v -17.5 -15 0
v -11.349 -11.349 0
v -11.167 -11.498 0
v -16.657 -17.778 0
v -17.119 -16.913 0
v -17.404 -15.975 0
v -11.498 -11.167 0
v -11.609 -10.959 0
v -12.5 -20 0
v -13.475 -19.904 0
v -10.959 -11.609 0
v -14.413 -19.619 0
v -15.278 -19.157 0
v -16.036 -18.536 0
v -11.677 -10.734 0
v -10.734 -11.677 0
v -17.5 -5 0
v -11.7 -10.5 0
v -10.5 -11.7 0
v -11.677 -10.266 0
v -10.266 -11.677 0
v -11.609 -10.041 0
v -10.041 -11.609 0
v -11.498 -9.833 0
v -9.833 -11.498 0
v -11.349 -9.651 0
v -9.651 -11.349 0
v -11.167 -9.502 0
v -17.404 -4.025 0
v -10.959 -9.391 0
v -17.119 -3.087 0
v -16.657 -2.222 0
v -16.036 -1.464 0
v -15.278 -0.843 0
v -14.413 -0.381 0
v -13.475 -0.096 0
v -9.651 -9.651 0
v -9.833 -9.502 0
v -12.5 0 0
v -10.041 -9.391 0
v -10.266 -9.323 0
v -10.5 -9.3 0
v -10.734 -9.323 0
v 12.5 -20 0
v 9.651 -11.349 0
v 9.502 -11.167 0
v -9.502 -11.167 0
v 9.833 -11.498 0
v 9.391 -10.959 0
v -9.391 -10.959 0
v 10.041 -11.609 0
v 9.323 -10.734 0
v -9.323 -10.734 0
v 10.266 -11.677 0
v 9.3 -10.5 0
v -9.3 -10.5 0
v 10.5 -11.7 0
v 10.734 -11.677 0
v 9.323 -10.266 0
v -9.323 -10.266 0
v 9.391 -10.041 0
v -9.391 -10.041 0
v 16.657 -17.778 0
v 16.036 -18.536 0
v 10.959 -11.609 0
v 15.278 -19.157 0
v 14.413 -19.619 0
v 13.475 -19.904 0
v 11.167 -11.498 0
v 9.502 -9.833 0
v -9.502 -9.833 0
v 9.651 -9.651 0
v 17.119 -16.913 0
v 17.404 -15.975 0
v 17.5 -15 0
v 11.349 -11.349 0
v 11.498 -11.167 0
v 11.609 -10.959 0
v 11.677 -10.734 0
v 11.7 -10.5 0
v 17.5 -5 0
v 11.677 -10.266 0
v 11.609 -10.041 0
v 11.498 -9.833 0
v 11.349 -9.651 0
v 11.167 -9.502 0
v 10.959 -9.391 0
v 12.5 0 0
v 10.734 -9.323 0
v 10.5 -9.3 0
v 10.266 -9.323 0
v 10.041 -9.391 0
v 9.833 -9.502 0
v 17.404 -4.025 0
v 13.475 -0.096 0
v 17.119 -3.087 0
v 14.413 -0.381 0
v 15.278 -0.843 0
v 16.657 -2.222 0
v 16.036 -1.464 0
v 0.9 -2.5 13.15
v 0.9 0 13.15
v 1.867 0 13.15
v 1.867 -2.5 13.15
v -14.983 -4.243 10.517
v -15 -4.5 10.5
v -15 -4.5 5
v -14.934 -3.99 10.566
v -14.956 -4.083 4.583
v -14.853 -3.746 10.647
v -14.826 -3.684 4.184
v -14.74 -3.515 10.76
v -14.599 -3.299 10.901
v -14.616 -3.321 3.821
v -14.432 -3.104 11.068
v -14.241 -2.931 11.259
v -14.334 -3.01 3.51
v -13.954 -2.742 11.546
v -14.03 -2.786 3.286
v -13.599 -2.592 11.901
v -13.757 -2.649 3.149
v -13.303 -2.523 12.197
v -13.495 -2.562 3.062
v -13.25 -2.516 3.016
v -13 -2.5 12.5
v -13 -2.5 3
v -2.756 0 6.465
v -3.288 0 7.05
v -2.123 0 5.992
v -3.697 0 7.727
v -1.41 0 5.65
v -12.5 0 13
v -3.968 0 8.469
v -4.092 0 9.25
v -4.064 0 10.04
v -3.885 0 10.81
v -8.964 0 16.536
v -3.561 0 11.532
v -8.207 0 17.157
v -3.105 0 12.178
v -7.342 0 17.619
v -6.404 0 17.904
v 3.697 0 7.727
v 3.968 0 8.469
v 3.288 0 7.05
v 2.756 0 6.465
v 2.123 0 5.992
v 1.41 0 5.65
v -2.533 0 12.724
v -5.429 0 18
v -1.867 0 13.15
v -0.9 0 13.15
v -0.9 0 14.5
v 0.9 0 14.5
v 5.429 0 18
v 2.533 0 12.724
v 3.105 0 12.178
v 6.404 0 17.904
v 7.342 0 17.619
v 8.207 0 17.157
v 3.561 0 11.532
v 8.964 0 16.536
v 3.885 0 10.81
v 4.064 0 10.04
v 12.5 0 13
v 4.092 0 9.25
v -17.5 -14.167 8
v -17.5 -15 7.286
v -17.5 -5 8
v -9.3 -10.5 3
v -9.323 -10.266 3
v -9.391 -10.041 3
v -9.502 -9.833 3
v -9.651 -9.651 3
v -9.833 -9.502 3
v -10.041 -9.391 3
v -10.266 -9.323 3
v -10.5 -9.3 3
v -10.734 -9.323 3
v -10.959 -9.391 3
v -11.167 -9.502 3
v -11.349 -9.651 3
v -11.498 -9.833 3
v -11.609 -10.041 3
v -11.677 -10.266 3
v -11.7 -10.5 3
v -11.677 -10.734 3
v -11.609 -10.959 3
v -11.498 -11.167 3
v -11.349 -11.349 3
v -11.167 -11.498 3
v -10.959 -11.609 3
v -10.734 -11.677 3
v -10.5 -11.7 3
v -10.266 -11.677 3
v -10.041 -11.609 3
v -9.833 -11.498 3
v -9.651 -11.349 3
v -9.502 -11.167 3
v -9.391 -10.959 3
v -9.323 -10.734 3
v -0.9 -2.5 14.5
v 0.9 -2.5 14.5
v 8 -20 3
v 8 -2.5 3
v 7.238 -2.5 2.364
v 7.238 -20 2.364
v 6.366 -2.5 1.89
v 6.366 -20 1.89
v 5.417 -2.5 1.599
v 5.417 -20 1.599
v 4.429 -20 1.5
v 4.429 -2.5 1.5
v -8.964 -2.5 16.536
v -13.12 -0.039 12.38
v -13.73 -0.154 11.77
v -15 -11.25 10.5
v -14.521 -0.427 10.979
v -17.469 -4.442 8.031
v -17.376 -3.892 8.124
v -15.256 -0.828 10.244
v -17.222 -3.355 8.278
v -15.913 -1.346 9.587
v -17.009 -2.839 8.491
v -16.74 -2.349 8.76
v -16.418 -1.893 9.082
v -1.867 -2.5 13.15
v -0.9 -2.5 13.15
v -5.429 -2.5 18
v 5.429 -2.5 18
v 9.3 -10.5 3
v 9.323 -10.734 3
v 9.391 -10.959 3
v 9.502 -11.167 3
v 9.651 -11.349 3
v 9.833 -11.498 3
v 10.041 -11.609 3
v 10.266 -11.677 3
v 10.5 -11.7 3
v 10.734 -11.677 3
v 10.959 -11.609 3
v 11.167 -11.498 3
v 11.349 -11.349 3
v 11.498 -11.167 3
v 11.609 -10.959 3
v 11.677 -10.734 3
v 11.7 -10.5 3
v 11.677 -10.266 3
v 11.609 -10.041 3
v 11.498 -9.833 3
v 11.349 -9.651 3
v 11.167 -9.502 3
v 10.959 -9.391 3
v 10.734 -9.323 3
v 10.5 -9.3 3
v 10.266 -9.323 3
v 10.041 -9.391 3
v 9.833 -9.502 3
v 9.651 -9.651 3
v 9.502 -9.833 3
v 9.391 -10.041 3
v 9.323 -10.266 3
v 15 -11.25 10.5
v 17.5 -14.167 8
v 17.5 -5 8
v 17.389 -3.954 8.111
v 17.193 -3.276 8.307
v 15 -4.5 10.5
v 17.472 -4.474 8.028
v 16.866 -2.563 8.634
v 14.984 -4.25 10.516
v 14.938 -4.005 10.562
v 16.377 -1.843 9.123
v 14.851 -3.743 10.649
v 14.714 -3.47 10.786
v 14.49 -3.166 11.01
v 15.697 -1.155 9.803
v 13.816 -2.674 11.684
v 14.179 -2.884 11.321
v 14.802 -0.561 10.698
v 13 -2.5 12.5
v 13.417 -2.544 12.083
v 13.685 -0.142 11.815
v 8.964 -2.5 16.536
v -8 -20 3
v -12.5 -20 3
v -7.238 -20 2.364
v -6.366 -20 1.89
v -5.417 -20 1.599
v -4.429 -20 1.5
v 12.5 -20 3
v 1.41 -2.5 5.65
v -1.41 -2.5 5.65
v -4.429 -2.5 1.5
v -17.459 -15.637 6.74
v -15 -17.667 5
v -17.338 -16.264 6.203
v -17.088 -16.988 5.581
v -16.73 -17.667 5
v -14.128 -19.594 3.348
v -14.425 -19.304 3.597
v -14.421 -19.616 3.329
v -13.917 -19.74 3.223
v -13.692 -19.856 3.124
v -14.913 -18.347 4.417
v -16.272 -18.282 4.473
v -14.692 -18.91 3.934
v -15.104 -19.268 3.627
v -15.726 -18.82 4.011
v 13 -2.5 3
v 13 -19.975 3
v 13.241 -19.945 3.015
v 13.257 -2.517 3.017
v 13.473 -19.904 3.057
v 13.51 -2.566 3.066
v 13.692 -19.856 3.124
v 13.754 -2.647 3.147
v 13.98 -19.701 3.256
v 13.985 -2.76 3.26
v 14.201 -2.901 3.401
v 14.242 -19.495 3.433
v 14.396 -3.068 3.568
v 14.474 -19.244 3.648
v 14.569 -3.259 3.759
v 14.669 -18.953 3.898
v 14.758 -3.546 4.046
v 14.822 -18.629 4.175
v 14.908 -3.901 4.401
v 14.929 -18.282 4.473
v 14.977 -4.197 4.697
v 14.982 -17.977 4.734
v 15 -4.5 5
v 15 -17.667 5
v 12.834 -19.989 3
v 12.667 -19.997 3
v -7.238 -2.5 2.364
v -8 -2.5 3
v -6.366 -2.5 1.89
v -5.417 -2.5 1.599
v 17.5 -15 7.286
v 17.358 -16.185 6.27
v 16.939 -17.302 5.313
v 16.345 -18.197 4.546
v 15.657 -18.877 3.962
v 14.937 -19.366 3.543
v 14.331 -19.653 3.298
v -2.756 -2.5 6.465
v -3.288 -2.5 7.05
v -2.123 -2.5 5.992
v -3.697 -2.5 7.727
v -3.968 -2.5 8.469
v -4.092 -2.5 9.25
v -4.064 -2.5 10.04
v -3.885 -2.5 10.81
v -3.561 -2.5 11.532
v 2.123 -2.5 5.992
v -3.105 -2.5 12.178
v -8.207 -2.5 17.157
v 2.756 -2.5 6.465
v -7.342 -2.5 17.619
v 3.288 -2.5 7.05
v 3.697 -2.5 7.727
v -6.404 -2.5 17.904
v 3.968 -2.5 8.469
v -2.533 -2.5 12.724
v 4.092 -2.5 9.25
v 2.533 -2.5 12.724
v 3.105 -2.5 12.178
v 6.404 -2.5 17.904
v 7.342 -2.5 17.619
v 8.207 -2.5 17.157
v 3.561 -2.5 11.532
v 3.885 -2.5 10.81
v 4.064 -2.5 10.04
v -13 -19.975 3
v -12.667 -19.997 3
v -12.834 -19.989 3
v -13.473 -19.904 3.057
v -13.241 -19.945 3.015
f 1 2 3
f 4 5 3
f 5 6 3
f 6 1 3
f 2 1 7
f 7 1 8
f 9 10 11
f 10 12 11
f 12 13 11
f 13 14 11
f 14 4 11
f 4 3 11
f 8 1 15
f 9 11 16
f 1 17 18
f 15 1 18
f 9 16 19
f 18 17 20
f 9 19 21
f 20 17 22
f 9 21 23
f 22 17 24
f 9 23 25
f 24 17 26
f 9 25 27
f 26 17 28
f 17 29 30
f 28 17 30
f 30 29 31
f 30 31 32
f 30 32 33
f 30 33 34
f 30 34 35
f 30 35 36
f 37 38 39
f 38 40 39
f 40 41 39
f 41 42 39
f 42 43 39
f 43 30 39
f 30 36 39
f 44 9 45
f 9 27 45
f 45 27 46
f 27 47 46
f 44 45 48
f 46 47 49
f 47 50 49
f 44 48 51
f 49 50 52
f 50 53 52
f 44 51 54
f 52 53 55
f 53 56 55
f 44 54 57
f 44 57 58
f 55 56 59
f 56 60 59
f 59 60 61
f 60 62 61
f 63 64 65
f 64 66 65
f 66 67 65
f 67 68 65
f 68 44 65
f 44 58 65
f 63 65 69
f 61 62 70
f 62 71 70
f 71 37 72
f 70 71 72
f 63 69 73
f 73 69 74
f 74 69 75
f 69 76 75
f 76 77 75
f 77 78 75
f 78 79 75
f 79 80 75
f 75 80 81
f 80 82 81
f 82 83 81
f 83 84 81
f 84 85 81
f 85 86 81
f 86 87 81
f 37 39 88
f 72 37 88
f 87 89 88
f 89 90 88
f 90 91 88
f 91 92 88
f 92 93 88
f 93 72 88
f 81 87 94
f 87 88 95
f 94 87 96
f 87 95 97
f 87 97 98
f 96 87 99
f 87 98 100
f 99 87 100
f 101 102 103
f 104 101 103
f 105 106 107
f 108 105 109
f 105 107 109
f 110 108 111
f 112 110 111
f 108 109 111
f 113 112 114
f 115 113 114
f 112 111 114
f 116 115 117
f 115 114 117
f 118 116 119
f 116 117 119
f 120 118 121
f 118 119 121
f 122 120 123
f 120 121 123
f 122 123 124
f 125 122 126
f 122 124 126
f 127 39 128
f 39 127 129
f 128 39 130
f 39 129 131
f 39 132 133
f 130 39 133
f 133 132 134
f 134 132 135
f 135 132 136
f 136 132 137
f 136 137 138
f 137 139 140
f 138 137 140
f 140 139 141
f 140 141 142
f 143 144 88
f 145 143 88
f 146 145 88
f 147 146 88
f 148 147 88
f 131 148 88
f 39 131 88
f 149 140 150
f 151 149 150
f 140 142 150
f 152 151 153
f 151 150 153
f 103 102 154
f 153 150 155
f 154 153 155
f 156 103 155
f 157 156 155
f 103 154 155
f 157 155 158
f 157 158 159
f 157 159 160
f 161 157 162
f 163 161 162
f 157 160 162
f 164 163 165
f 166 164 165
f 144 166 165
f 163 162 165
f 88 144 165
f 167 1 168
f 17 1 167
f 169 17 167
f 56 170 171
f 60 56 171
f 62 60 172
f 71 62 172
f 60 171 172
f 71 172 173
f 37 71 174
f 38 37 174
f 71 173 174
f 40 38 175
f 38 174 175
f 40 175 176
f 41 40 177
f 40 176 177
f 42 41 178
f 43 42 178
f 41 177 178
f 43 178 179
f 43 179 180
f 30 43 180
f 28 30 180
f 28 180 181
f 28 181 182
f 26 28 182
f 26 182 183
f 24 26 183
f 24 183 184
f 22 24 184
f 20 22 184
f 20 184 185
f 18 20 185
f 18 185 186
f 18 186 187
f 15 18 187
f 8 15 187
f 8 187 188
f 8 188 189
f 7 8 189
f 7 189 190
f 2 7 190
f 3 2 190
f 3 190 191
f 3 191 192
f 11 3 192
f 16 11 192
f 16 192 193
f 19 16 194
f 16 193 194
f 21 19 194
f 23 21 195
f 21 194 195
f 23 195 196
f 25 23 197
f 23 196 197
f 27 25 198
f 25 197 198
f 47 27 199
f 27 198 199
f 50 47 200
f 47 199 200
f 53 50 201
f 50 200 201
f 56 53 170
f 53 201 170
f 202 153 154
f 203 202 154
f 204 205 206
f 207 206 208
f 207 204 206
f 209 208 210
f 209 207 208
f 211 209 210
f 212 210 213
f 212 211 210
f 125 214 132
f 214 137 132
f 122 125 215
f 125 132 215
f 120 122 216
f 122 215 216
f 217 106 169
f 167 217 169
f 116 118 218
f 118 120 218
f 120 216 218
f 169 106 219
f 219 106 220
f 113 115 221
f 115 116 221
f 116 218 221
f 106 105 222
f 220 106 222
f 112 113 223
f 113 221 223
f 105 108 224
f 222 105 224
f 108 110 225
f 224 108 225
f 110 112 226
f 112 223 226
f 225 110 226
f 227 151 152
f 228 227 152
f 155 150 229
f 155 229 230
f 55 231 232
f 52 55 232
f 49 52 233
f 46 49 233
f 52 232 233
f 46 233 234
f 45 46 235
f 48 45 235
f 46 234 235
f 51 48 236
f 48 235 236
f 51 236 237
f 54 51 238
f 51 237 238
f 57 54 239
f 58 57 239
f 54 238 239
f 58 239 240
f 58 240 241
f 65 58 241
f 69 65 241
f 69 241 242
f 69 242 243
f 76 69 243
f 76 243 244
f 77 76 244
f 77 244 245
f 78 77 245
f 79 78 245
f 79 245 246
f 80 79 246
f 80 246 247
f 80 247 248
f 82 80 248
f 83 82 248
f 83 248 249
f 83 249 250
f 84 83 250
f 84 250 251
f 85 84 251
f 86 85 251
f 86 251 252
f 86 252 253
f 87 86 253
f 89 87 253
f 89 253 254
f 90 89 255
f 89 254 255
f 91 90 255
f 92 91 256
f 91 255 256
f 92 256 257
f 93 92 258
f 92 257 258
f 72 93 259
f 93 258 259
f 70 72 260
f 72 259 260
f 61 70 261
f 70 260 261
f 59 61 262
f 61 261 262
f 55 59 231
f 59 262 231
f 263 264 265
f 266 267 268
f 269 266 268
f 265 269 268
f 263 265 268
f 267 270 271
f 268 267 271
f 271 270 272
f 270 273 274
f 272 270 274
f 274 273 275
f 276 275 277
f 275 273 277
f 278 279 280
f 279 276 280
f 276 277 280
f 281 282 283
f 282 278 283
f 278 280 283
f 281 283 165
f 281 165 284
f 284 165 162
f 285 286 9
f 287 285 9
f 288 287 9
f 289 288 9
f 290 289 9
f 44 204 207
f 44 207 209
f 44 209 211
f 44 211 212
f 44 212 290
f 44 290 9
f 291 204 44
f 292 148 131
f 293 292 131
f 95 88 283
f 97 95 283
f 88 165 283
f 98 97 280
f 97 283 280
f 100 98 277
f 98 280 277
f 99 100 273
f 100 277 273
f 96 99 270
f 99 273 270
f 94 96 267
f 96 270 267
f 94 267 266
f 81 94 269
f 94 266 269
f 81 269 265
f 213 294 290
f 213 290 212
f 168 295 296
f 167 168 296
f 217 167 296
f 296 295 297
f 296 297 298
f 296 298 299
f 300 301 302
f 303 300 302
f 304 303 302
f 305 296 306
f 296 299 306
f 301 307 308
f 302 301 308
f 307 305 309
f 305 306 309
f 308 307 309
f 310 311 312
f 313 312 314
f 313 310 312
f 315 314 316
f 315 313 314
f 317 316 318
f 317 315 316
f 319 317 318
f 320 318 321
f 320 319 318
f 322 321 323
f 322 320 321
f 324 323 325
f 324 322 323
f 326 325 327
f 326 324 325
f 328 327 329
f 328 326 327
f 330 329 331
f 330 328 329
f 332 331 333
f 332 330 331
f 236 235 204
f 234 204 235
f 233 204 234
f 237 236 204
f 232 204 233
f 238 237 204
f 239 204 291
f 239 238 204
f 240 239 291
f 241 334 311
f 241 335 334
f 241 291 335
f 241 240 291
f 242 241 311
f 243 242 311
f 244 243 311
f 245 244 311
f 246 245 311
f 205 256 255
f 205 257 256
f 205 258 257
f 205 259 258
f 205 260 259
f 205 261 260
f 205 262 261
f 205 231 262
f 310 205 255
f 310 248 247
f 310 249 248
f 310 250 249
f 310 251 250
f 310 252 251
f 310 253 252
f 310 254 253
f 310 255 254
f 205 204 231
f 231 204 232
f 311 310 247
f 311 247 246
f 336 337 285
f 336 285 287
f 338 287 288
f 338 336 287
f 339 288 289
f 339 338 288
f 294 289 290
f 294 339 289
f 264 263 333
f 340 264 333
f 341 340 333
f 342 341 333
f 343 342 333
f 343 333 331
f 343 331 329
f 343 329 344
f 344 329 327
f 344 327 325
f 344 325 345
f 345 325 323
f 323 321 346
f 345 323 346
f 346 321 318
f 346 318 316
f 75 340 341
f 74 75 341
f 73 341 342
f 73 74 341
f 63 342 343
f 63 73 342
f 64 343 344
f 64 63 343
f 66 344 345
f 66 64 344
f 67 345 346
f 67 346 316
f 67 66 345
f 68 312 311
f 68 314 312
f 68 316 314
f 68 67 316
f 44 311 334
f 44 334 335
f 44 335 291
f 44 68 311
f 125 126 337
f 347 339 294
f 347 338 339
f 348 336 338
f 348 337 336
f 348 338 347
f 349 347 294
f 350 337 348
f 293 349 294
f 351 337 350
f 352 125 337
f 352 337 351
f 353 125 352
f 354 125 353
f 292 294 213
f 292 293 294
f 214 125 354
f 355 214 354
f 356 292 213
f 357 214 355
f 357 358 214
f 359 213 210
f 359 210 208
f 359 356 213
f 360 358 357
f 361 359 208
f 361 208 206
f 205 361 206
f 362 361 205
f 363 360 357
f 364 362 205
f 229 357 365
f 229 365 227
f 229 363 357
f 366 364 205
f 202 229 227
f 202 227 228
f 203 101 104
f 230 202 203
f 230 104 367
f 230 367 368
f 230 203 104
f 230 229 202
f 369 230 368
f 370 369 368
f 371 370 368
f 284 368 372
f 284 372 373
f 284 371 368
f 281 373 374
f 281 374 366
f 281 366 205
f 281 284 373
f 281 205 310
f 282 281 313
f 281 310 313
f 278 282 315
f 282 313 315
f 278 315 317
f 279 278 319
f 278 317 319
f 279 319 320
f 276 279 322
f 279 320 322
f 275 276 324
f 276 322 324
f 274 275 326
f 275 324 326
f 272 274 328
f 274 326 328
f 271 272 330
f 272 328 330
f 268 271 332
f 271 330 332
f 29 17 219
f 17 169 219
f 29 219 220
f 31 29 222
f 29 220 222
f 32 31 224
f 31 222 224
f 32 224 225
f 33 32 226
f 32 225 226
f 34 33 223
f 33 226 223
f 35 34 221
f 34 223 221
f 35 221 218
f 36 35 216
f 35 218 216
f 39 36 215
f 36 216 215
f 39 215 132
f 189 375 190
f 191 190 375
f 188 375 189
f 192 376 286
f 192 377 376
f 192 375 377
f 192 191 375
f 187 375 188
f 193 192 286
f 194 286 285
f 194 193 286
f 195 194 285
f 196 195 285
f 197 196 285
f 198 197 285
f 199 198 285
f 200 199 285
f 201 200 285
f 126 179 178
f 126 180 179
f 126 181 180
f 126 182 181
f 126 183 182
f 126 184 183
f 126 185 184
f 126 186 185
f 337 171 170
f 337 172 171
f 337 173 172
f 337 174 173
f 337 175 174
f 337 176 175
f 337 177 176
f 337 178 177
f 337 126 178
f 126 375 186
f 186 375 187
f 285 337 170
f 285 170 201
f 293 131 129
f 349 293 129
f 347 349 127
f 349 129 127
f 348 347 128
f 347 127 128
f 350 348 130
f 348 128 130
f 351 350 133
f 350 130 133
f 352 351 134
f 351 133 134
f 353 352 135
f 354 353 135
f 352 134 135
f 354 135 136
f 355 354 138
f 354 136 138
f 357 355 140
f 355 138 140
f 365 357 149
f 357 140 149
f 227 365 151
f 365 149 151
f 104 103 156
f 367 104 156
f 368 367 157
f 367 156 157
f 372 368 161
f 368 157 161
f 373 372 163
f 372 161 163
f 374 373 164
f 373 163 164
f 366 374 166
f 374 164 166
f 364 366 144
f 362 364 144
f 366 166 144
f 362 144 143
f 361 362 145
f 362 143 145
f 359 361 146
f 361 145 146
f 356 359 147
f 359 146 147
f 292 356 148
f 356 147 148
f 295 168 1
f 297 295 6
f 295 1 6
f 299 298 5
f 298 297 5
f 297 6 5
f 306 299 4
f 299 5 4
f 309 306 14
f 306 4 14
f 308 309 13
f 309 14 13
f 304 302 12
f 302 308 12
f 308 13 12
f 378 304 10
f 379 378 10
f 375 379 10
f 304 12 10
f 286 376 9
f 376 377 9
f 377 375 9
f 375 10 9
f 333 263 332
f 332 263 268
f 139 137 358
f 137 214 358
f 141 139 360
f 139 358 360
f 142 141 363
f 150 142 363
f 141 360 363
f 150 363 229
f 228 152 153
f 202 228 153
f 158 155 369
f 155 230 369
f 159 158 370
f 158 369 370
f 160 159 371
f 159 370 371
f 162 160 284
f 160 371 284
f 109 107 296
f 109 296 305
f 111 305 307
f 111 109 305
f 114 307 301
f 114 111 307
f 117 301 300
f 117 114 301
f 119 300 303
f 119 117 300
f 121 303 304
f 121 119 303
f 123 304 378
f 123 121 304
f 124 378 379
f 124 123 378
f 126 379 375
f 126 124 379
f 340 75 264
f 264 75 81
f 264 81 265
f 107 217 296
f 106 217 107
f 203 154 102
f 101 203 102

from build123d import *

# Parameters (mm, degrees)
F0_W          = 35
F0_H          = 18
F1_DEPTH      = 20
F2_W          = 30
F2_H          = 23.709095493
F3_DEPTH      = 15
F5_DEPTH      = 32.5
F6_T1_DEPTH   = 53.9336597593
F7_R          = 2
F10_DEPTH     = 25
F11_R         = 5
F12_W         = 16
F12_H         = 17.5
F13_DEPTH     = 1.5
F14_T4_DEPTH  = 26.4267855357
F14_T9_DEPTH  = 26.4267855357
F14_T11_DEPTH = 28
F14_T13_DEPTH = 28
F15_R         = 1.2
F16_DEPTH     = 3.0010001


# Not quite as in the source:
# - a fillet or chamfer that OpenCascade refuses, or shapes differently, is made with other operations: its cross-section is extruded or revolved along the edge and cut away or added


with BuildPart() as f1:
    # F0 (on Front) → F1 (new body)
    with BuildSketch(Plane.XZ):
        with Locations((0, 9)):
            Rectangle(F0_W, F0_H)
    extrude(amount=F1_DEPTH)

    # F2 (on face) → F3 (cut)
    with BuildSketch(Plane.XY.offset(18)):
        with Locations((0, -14.3545477465)):
            Rectangle(F2_W, F2_H)
    extrude(amount=-F3_DEPTH, mode=Mode.SUBTRACT)

    # F4 (on face) → F5 (cut, symmetric)
    with BuildSketch(Plane(origin=(15, 0, 0), x_dir=(0, -1, 0), z_dir=(-1, 0, 0))):
        Polygon((20, 18), (2.5, 18), (20, 3), align=None)
    extrude(amount=F5_DEPTH, both=True, mode=Mode.SUBTRACT)

    # F6: chamfer of 10 on 2 edges, made by hand

    # F6_s2 → F6_t1 (cut)
    with BuildSketch(Plane.XZ.offset(-25.7168298797)):
        Polygon((17.5, 8), (7.5, 18), (17.5, 18), align=None)
        Polygon((-7.5, 18), (-17.5, 8), (-17.5, 18), align=None)
    extrude(amount=F6_T1_DEPTH, mode=Mode.SUBTRACT)

    # F7
    f7_edges = [f1.edges().sort_by_distance(p)[0] for p in [
        (-15, -2.5, 6.75),
        (15, -2.5, 6.75),
        (-15, -11.25, 3),
        (15, -11.25, 3),
    ]]
    fillet(f7_edges, radius=F7_R)

    # F8 (on face) → F10 (cut)
    with BuildSketch(Plane(origin=(0, 0, 0), x_dir=(-1, 0, 0), z_dir=(0, 1, 0))):
        with BuildLine():
            Line((-1.409787218, 5.65), (1.409787218, 5.65))
            ThreePointArc((1.409787218, 5.65), (4.0923866141, 9.2502565294), (1.8674849397, 13.15))
            Line((1.8674849397, 13.15), (0.9, 13.15))
            Line((0.9, 13.15), (0.9, 14.5))
            Line((0.9, 14.5), (-0.9, 14.5))
            Line((-0.9, 14.5), (-0.9, 13.15))
            Line((-0.9, 13.15), (-1.8674849397, 13.15))
            ThreePointArc((-1.8674849397, 13.15), (-4.0923866141, 9.2502565294), (-1.409787218, 5.65))
        make_face()
    extrude(amount=-F10_DEPTH, mode=Mode.SUBTRACT)

    # F11
    f11_edges = [f1.edges().sort_by_distance(p)[0] for p in [
        (7.5, -1.25, 18),
        (-7.5, -1.25, 18),
        (17.5, 0, 4),
        (-17.5, 0, 4),
    ]]
    fillet(f11_edges, radius=F11_R)

    # F12 (on face) → F13 (cut)
    with BuildSketch(Plane.XY.offset(3)):
        with Locations((0, -11.25)):
            Rectangle(F12_W, F12_H)
    extrude(amount=-F13_DEPTH, mode=Mode.SUBTRACT)

    # F14: fillet of radius 5 on 4 edges, made by hand


with BuildPart() as f14_tool2:
    # F14_s3 → F14_t4 (new body)
    with BuildSketch(Plane.XZ.offset(20)):
        with BuildLine():
            ThreePointArc((8, 3), (6.3657774588, 1.8902277714), (4.4292857857, 1.5))
            Line((4.4292857857, 1.5), (8, 1.5))
            Line((8, 1.5), (8, 3))
        make_face()
    extrude(amount=-F14_T4_DEPTH)

    split(bisect_by=Plane.XZ, keep=Keep.TOP)


with BuildPart() as f1_1:
    add(f1.part)

    # F14_t1: union F14_tool2
    add(f14_tool2.part)


with BuildPart() as f14_tool7:
    # F14_s8 → F14_t9 (new body)
    with BuildSketch(Plane.XZ.offset(-6.4267855357)):
        with BuildLine():
            ThreePointArc((-8, 3), (-6.3657774588, 1.8902277714), (-4.4292857857, 1.5))
            Line((-4.4292857857, 1.5), (-8, 1.5))
            Line((-8, 1.5), (-8, 3))
        make_face()
    extrude(amount=F14_T9_DEPTH)

    split(bisect_by=Plane.XZ, keep=Keep.TOP)


with BuildPart() as f1_2:
    add(f1_1.part)

    # F14_t6: union F14_tool7
    add(f14_tool7.part)

    # F14_s12 → F14_t11 (cut)
    with BuildSketch(Plane.XY.offset(-12.5)):
        with BuildLine():
            ThreePointArc((17.5, -15), (16.0355339059, -18.5355339059), (12.5, -20))
            Line((12.5, -20), (17.5, -20))
            Line((17.5, -20), (17.5, -15))
        make_face()
    extrude(amount=F14_T11_DEPTH, mode=Mode.SUBTRACT)

    # F14_s14 → F14_t13 (cut)
    with BuildSketch(Plane.XY.offset(-12.5)):
        with BuildLine():
            ThreePointArc((-17.5, -15), (-16.0355339059, -18.5355339059), (-12.5, -20))
            Line((-12.5, -20), (-17.5, -20))
            Line((-17.5, -20), (-17.5, -15))
        make_face()
    extrude(amount=F14_T13_DEPTH, mode=Mode.SUBTRACT)

    # F15 (on face) → F16 (cut, through all)
    with BuildSketch(Plane.XY.offset(3)):
        with Locations((-10.5, -10.5)):
            Circle(F15_R)
        with BuildLine():
            ThreePointArc((11.7, -10.5), (10.5, -9.3), (9.3, -10.5))
            ThreePointArc((9.3, -10.5), (10.5, -11.7), (11.7, -10.5))
        make_face()
    extrude(amount=-F16_DEPTH, mode=Mode.SUBTRACT)


solid = f1_2.part
